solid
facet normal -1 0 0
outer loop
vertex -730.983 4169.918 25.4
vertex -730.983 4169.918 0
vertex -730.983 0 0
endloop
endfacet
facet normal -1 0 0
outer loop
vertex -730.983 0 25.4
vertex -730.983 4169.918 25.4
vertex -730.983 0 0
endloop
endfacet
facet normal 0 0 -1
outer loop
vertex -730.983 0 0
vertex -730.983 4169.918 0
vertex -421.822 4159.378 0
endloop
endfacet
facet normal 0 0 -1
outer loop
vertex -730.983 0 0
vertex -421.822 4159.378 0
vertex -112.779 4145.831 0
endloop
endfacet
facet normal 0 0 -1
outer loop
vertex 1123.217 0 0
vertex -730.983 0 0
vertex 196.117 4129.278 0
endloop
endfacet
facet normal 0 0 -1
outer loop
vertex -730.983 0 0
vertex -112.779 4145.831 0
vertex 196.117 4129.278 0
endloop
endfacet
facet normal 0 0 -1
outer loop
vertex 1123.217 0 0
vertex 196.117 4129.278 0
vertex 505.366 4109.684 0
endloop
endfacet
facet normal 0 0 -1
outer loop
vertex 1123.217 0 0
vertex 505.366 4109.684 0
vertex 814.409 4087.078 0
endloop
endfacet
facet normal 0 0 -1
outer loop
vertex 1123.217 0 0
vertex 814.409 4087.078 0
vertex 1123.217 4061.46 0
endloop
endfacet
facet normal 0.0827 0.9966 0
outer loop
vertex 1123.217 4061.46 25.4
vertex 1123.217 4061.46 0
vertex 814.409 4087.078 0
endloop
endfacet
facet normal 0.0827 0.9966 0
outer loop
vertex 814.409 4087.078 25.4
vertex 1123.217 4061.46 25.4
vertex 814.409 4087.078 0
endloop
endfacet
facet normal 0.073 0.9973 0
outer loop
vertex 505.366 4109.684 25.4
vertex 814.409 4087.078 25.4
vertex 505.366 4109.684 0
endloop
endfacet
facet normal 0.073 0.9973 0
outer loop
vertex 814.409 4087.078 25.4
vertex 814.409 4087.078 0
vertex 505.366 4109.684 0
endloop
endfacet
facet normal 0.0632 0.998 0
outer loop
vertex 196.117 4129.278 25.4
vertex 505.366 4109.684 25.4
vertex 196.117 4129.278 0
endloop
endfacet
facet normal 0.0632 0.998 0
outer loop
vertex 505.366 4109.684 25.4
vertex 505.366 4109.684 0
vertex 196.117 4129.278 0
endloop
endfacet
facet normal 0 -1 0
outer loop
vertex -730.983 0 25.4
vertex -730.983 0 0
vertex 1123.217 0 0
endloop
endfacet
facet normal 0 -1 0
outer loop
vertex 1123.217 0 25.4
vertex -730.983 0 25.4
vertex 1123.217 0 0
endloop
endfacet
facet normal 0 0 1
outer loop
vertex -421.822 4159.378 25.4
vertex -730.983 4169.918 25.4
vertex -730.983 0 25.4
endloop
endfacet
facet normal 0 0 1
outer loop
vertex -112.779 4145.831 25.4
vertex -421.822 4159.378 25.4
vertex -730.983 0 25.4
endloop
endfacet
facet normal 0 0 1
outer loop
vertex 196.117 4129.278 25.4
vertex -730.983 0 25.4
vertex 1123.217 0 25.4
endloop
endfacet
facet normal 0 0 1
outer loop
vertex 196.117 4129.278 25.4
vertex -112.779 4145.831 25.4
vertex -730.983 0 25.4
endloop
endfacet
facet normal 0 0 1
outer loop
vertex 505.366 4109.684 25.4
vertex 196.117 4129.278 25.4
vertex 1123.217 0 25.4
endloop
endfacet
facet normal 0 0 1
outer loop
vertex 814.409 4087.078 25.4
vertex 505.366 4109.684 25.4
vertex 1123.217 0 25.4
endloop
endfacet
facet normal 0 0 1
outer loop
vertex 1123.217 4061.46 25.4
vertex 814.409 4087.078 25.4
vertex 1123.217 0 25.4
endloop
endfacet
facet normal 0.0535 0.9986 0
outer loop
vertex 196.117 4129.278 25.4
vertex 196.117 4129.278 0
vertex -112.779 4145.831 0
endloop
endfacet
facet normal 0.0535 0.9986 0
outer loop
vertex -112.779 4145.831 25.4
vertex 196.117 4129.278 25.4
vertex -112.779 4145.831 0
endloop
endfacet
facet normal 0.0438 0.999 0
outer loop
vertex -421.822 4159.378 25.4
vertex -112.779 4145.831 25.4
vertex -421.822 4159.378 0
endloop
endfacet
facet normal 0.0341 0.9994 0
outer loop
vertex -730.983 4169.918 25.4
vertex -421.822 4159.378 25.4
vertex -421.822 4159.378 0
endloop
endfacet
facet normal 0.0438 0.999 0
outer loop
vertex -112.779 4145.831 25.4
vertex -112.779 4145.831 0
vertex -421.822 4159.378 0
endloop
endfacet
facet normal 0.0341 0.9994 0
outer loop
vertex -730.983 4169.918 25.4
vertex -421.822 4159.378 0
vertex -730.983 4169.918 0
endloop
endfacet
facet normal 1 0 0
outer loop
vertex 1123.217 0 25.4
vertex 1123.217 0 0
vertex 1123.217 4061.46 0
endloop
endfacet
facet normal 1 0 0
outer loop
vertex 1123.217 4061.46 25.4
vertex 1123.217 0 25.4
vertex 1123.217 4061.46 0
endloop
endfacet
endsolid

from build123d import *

# Parameters (mm, degrees)
F1_DEPTH = 25.4


with BuildPart() as f1:
    # F0 (on Top) → F1 (new body)
    with BuildSketch(Plane.XY):
        with BuildLine():
            Line((-730.982687, 4169.918), (-730.982687, 0))
            Line((-730.982687, 0), (196.117313, 0))
            Line((196.117313, 0), (196.117313, 4129.278))
            ThreePointArc((196.117313, 4129.278), (-267.284409, 4152.980596), (-730.982687, 4169.918))
        make_face()
        with BuildLine():
            Line((196.117313, 4129.278), (196.117313, 0))
            Line((196.117313, 0), (1123.217313, 0))
            Line((1123.217313, 0), (1123.217313, 4061.46))
            ThreePointArc((1123.217313, 4061.46), (659.915175, 4098.75738), (196.117313, 4129.278))
        make_face()
    extrude(amount=F1_DEPTH)


solid = f1.part
